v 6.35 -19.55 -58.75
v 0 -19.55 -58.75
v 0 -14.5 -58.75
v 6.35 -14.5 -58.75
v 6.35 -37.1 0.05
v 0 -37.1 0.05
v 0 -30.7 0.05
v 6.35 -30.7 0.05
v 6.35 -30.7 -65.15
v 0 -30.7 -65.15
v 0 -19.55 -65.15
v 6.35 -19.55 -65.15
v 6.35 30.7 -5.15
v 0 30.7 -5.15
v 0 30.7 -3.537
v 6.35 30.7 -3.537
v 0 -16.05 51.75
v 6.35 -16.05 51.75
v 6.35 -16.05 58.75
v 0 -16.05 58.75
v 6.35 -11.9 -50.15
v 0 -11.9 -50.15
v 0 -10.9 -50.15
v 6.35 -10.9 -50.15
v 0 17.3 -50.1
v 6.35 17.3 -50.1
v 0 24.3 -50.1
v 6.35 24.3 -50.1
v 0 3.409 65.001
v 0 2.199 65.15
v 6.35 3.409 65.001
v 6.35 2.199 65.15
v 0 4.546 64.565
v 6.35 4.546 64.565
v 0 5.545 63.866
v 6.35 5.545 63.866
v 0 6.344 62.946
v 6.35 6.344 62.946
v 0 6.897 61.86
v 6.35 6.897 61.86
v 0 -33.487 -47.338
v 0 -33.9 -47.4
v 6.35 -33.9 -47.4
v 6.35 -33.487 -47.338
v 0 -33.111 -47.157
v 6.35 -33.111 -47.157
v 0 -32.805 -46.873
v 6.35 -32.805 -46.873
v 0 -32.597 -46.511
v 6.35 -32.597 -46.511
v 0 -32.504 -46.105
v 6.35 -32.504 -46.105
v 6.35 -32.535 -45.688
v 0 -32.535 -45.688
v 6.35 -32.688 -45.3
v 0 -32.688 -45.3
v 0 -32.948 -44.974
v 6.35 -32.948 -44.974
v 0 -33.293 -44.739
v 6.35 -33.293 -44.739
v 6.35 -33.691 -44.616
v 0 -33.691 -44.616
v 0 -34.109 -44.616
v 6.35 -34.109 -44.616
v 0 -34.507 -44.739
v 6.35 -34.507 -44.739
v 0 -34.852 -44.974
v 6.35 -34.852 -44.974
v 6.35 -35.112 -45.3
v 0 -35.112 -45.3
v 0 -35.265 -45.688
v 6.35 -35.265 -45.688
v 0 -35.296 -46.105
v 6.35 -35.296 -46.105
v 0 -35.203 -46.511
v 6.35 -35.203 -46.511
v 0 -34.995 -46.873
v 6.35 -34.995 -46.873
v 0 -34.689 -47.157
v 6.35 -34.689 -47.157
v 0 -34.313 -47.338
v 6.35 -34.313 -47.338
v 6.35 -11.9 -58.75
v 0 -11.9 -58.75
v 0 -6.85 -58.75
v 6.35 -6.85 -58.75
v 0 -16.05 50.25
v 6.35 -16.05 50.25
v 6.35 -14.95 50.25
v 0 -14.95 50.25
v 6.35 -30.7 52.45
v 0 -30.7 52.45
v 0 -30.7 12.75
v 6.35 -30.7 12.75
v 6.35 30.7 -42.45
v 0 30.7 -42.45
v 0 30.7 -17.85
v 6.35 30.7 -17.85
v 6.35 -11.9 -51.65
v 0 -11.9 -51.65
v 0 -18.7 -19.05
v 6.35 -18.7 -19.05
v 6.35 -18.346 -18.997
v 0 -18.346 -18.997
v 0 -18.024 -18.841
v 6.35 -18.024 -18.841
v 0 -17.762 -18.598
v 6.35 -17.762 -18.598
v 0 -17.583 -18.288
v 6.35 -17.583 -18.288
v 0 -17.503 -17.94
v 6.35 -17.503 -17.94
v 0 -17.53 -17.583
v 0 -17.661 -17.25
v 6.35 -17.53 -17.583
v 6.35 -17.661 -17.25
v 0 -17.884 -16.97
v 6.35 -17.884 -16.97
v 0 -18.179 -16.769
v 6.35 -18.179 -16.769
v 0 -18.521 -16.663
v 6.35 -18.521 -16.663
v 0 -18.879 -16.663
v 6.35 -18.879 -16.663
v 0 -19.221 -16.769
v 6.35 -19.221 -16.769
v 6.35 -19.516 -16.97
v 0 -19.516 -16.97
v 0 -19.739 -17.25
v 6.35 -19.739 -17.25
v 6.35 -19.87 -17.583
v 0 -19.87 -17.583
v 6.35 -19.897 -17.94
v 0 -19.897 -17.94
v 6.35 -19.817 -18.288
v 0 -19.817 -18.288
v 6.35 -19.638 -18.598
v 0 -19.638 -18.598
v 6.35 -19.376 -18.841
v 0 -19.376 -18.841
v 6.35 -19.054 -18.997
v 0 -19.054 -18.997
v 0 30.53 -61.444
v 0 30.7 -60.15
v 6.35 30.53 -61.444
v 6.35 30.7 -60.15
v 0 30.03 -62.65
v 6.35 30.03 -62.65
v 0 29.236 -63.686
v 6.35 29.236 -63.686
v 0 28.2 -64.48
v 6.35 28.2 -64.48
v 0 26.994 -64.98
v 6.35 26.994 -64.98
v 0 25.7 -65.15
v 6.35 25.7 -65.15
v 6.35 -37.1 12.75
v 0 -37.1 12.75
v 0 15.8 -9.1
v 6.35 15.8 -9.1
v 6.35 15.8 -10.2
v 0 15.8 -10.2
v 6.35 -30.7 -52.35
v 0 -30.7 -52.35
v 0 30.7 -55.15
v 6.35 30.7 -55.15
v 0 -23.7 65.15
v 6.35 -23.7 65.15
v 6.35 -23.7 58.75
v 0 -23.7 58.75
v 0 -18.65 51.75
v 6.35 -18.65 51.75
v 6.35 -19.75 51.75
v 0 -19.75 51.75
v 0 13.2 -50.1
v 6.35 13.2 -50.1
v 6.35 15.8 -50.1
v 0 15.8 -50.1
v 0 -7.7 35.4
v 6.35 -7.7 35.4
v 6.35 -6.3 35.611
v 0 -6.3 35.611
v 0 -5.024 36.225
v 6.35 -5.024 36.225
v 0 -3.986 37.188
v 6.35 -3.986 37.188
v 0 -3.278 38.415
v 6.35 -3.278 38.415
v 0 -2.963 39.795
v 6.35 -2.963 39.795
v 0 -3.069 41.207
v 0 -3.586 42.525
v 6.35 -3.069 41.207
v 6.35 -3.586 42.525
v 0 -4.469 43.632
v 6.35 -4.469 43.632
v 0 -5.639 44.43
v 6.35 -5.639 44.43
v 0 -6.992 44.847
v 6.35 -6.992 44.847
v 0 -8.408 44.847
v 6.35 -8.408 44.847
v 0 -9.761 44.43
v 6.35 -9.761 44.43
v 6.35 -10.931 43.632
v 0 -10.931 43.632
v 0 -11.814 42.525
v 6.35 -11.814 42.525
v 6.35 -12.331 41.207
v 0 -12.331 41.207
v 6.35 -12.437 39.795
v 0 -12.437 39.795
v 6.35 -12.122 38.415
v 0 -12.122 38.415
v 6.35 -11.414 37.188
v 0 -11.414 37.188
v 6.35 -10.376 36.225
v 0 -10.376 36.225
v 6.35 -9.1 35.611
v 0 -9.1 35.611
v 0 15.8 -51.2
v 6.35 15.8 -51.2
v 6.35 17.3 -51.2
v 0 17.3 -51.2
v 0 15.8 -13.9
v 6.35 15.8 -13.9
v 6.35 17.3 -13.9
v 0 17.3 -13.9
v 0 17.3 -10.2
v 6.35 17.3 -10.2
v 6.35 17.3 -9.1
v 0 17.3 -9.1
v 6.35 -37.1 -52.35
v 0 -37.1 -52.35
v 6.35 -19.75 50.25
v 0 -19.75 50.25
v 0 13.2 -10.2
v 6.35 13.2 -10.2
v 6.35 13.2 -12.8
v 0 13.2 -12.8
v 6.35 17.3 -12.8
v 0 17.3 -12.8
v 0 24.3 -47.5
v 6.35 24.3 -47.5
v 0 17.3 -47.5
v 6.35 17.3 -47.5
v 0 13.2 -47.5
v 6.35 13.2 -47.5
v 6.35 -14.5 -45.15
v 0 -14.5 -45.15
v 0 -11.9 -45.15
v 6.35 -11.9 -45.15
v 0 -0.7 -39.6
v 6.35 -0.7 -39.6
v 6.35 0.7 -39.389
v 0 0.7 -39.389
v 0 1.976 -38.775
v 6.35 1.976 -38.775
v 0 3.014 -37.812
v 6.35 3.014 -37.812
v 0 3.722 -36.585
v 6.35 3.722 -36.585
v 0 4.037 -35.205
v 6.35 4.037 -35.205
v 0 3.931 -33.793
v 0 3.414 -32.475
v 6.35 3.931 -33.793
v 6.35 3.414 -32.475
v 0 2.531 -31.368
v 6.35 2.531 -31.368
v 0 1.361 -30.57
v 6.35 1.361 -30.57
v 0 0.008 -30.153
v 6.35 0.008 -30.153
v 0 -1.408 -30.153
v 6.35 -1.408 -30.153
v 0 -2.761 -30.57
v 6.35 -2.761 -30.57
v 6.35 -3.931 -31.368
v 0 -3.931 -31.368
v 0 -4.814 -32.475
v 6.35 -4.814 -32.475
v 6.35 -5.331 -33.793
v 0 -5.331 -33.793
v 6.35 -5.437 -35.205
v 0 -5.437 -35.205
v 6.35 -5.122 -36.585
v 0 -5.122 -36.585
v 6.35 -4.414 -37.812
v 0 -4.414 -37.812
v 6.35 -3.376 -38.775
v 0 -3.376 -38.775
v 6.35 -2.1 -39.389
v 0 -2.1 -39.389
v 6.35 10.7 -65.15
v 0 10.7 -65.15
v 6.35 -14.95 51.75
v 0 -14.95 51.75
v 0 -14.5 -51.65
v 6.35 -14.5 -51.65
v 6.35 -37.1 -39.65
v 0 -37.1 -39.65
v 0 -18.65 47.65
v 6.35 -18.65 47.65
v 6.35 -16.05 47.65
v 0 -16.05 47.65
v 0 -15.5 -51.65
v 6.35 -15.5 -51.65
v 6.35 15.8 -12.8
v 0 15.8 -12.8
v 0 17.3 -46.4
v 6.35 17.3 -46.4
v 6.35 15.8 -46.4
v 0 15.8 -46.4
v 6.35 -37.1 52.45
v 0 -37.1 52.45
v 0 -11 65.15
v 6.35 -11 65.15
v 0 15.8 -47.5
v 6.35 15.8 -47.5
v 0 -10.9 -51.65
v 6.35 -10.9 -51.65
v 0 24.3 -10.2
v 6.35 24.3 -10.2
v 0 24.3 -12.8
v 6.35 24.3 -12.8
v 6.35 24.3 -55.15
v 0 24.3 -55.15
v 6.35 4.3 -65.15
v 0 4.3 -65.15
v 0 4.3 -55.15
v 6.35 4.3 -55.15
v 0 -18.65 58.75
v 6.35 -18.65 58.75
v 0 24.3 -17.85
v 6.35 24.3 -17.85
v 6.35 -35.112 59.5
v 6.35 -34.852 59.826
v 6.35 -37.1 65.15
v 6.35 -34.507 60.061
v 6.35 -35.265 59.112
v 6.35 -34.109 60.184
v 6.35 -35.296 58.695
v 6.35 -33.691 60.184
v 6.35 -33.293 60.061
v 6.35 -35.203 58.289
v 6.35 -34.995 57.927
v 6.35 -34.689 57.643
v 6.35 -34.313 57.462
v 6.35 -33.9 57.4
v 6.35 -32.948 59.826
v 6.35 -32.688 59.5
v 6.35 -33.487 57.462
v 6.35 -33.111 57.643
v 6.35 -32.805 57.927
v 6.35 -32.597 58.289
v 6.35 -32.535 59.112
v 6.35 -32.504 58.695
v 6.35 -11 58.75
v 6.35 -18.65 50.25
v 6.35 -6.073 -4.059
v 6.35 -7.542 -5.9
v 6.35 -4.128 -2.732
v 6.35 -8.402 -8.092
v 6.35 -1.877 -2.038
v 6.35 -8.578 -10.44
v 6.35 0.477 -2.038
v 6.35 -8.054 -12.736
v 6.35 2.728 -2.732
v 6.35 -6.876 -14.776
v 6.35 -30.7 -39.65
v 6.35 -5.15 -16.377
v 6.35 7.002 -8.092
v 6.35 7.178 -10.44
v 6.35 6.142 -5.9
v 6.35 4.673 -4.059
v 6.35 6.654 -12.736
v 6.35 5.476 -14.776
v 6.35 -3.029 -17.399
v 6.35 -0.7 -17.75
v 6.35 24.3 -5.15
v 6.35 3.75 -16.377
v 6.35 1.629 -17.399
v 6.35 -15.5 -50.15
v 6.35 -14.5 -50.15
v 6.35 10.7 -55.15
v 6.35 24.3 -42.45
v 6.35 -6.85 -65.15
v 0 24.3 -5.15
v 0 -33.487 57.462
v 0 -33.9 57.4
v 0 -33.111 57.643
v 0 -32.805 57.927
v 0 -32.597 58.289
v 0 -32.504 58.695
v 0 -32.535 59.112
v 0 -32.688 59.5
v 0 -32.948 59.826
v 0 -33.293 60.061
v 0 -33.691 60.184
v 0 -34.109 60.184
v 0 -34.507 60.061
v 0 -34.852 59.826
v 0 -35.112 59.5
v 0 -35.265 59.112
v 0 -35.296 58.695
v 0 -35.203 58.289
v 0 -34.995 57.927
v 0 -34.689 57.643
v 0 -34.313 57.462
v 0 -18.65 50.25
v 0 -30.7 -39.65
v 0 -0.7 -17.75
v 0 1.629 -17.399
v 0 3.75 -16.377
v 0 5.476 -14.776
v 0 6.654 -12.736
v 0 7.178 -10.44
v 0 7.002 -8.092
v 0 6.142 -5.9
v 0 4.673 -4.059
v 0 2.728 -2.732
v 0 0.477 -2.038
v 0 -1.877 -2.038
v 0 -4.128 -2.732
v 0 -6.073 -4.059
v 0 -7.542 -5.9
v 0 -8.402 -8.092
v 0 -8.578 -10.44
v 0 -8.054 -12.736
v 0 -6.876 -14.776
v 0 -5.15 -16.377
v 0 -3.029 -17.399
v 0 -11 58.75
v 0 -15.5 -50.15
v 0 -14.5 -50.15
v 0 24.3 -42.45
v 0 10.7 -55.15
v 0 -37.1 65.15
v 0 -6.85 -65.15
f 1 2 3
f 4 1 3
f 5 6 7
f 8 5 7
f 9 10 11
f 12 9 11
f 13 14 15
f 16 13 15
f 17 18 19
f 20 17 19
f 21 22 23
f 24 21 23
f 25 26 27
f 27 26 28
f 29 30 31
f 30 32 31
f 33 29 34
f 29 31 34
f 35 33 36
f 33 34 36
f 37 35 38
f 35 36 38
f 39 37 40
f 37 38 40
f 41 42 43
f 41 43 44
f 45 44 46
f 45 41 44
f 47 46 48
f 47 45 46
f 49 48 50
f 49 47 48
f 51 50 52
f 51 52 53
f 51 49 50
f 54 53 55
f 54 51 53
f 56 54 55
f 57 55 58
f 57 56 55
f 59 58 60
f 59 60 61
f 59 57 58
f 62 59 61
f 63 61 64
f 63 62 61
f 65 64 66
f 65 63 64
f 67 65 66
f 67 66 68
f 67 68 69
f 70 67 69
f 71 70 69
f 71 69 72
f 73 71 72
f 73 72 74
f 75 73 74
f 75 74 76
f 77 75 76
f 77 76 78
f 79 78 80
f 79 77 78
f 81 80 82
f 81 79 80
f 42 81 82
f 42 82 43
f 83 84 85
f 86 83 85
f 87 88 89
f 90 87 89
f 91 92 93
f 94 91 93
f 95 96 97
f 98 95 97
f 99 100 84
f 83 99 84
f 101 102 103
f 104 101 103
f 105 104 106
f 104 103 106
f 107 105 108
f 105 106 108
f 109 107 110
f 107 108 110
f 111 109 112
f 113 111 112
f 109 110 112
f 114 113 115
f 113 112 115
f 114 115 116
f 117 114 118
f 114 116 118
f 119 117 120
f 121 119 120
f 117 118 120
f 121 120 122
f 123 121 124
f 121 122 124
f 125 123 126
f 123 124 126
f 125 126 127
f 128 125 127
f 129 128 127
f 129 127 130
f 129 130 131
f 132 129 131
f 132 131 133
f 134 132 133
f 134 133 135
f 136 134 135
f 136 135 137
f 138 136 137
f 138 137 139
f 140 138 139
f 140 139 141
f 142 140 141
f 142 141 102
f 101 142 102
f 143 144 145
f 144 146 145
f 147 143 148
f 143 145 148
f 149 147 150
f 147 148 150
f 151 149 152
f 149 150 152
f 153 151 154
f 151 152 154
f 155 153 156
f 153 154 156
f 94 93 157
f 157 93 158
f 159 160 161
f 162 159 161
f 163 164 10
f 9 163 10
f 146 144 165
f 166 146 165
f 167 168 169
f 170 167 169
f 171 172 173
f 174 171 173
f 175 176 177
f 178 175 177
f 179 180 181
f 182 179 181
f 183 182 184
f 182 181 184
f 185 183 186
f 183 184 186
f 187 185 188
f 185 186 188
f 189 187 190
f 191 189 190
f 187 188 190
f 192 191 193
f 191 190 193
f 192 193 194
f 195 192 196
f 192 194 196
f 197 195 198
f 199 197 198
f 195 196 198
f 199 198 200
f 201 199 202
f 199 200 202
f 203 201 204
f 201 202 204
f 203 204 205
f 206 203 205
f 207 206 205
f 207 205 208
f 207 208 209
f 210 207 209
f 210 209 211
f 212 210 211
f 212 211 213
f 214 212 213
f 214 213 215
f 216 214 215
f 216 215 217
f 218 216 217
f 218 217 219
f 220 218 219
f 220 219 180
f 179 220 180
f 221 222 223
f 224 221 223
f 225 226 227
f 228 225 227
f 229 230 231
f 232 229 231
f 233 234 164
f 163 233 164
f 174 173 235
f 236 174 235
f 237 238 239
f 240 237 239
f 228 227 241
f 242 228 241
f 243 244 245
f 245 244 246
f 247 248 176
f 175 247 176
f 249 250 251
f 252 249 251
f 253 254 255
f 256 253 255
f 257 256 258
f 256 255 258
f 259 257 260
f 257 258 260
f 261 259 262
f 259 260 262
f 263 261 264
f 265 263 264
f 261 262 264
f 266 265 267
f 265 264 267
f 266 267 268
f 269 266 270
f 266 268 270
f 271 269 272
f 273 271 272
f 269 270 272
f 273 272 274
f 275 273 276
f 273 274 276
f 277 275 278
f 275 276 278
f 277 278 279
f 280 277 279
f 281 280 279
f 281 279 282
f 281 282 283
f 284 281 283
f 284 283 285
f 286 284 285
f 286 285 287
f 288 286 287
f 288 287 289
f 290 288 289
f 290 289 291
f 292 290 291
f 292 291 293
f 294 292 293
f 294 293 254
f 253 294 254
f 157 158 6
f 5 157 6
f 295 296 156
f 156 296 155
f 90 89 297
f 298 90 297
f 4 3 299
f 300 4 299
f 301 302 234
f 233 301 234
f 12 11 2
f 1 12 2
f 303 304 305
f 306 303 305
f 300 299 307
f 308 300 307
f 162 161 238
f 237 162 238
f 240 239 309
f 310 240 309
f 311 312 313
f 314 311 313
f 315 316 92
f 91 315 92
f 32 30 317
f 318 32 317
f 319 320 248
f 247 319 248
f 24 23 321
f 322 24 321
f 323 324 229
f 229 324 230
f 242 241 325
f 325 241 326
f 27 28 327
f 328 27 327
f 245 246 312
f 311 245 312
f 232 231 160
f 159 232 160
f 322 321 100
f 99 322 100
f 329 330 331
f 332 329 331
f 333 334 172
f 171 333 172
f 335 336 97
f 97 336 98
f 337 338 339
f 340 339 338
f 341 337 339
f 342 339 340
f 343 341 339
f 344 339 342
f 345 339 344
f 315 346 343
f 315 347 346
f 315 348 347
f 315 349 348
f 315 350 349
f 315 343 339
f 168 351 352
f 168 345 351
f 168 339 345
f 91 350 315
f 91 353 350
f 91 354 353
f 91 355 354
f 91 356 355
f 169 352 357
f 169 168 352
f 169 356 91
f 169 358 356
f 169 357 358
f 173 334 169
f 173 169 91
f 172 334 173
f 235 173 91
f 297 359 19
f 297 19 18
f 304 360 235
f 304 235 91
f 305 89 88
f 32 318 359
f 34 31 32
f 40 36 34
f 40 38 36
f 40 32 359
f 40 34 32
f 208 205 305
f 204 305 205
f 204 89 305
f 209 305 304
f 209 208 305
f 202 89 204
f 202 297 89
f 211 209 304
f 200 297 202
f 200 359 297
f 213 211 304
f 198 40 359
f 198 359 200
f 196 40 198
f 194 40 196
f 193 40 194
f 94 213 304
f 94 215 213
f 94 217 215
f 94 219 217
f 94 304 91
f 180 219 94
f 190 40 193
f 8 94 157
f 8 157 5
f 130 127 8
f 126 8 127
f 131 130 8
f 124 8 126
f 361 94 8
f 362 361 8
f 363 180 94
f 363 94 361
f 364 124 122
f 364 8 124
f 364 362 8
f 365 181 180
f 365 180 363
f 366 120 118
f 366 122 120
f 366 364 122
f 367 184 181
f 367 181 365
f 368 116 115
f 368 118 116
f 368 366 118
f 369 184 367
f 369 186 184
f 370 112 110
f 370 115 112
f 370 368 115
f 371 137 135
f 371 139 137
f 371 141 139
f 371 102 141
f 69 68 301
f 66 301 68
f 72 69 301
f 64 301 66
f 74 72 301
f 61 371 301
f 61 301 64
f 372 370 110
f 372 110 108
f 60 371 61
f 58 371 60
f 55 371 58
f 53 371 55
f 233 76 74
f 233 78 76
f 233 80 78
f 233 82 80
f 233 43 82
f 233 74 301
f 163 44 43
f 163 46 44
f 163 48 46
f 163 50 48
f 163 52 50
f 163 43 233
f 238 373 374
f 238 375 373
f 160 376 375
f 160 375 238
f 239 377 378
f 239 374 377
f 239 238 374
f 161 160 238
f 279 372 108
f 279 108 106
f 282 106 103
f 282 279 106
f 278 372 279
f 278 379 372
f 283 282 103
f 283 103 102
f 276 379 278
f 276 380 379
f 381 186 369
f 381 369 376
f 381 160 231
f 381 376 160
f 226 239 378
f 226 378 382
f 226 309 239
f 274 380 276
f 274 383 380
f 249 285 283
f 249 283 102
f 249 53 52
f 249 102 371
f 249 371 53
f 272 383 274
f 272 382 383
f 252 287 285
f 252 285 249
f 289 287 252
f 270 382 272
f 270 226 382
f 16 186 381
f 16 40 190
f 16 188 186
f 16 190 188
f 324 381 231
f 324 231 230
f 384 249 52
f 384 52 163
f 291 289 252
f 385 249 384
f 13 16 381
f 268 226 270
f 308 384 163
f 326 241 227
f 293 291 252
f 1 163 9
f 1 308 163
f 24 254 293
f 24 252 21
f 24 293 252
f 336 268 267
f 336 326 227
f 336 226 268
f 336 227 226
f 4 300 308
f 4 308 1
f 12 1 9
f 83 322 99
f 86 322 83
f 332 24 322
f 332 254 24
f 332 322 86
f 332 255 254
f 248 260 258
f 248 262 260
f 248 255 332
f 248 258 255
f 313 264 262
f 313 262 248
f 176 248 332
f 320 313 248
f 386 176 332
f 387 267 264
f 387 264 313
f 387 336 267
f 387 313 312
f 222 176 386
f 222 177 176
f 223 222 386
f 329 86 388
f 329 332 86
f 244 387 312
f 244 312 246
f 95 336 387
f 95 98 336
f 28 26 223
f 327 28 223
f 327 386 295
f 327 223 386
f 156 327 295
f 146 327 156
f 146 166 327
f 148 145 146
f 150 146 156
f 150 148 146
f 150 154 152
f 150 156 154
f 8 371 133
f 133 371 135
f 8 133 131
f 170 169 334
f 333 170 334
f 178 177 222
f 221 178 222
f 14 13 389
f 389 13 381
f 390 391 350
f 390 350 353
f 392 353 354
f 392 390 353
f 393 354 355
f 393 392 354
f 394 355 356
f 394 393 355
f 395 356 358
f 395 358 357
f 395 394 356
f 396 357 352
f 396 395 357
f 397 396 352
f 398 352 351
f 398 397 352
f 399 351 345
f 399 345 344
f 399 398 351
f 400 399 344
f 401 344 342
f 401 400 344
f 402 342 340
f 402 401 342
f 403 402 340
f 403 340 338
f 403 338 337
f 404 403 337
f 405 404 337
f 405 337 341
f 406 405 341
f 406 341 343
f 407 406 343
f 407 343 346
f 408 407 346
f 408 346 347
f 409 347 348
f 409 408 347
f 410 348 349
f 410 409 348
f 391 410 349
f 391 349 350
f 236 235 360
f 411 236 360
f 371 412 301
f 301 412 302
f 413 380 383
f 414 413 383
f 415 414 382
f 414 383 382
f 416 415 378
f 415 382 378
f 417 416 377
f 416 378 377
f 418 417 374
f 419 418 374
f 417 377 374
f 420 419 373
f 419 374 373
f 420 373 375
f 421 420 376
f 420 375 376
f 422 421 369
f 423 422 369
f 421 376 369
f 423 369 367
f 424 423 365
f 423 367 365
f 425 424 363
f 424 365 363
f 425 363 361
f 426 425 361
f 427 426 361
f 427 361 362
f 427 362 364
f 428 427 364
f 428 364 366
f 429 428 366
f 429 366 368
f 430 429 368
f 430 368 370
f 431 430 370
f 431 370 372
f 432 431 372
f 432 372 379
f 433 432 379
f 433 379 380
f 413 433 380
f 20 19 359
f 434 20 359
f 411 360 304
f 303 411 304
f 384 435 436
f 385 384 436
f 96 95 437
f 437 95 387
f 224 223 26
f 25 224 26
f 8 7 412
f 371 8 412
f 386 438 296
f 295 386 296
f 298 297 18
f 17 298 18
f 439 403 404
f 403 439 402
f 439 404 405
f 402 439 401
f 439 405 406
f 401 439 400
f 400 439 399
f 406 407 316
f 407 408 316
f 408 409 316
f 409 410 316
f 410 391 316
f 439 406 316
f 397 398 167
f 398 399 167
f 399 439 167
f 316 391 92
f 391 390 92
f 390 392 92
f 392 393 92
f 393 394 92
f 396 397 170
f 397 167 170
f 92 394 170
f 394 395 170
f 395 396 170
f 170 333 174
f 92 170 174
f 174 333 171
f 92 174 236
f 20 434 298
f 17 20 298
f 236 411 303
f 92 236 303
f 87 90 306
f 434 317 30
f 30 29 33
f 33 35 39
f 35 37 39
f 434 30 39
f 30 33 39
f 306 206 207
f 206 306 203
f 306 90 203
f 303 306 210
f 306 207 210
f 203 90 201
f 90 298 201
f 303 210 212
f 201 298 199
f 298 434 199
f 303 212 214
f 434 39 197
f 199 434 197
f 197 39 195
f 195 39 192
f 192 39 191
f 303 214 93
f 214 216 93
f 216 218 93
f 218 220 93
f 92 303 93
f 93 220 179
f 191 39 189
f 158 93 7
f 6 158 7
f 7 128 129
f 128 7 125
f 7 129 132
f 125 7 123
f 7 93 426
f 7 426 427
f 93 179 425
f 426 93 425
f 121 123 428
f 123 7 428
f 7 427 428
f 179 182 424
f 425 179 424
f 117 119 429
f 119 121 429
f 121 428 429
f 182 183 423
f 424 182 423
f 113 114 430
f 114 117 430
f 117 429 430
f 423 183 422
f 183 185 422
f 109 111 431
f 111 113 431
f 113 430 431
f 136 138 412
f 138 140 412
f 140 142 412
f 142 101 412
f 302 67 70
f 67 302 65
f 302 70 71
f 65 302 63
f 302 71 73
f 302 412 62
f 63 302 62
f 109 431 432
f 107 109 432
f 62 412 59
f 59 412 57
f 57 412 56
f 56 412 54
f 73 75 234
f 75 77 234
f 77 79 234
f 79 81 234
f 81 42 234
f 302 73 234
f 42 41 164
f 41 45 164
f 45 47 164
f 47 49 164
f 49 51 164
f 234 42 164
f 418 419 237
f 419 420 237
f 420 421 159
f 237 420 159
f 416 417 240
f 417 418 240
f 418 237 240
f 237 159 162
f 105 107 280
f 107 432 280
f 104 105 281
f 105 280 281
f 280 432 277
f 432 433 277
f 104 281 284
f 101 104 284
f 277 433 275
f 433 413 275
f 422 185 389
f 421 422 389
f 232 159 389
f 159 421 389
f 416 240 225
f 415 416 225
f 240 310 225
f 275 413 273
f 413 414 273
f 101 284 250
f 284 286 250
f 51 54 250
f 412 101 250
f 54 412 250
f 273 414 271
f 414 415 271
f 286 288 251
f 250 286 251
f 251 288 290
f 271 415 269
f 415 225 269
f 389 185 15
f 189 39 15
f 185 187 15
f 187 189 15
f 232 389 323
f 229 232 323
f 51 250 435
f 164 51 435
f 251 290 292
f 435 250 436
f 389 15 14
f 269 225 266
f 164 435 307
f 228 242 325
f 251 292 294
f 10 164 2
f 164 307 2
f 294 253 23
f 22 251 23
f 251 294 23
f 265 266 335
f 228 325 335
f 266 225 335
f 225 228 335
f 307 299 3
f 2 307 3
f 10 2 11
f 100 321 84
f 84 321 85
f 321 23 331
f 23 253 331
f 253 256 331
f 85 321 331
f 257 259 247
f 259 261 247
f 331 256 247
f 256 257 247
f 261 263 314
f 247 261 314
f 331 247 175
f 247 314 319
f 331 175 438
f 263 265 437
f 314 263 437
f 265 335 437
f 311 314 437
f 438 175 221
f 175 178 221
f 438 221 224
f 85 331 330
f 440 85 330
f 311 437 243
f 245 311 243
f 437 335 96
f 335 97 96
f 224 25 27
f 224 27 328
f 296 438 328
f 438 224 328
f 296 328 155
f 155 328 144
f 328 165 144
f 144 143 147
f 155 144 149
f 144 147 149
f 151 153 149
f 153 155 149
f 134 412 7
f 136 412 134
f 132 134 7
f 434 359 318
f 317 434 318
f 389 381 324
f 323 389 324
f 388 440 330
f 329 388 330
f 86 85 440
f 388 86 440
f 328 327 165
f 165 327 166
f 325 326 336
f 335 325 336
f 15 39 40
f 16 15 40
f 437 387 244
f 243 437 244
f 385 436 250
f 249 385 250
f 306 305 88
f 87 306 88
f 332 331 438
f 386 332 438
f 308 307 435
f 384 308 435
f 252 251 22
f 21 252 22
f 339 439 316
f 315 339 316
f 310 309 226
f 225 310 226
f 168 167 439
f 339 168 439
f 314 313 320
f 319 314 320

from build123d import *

# Parameters (mm, degrees)
SKETCH2_R              = 1.4
BOSS_EXTRUDE1_DEPTH    = 6.35
SKETCH3_R              = 4.75
SKETCH3_R_2            = 7.9
AXII_DEPTH             = 76.241311791
CHAMFER1_SIZE          = 25
CHAMFER1_SIZE2         = 68.686935486
FILLET1_R              = 5
PLATEATTACHMENTS_DEPTH = 76.241311791
SKETCH6_R              = 1.2
WIREGUIDE_DEPTH        = 76.241311791


with BuildPart() as part:
    # Sketch2 → Boss-Extrude1 (new body)
    with BuildSketch(Plane(origin=(0, 0, 0), x_dir=(0, 0, -1), z_dir=(1, 0, 0))):
        Polygon((52.35, -30.7), (65.15, -30.7), (65.15, -19.55), (58.75, -19.55), (58.75, -14.5), (51.65, -14.5), (51.65, -15.5), (50.15, -15.5), (50.15, -14.5), (45.15, -14.5), (45.15, -11.9), (50.15, -11.9), (50.15, -10.9), (51.65, -10.9), (51.65, -11.9), (58.75, -11.9), (58.75, -6.85), (65.15, -6.85), (65.15, 4.3), (55.15, 4.3), (55.15, 10.7), (65.15, 10.7), (65.15, 30.7), (-65.15, 30.7), (-65.15, -30.7), (-65.15, -37.1), (-52.45, -37.1), (-52.45, -30.7), (-12.75, -30.7), (-12.75, -37.1), (-0.05, -37.1), (-0.05, -30.7), (39.65, -30.7), (39.65, -37.1), (52.35, -37.1), align=None)
        with Locations((-58.8, -33.9)):
            Circle(SKETCH2_R, mode=Mode.SUBTRACT)
        with Locations((46, -33.9)):
            Circle(SKETCH2_R, mode=Mode.SUBTRACT)
    extrude(amount=BOSS_EXTRUDE1_DEPTH)

    # Sketch3 → Axii (cut, through all)
    with BuildSketch(Plane(origin=(6.35, 0, 0), x_dir=(0, 0, -1), z_dir=(1, 0, 0))):
        with Locations((-40.15, -7.7)):
            Circle(SKETCH3_R)
        with Locations((34.85, -0.7)):
            Circle(SKETCH3_R)
        with Locations((9.85, -0.7)):
            Circle(SKETCH3_R_2)
    extrude(amount=-AXII_DEPTH, mode=Mode.SUBTRACT)

    # Chamfer1
    chamfer1_edges = [part.edges().sort_by_distance(p)[0] for p in [
        (3.175, 30.7, 65.15),
    ]]
    chamfer1_side = [part.faces().sort_by_distance(p)[0] for p in [
        (3.175, -3.2, 65.15),
    ]]
    chamfer(chamfer1_edges, length=CHAMFER1_SIZE, length2=CHAMFER1_SIZE2, reference=chamfer1_side[0])

    # Fillet1
    fillet1_edges = [part.edges().sort_by_distance(p)[0] for p in [
        (3.175, 5.7, 65.15),
        (3.175, 30.7, -65.15),
    ]]
    fillet(fillet1_edges, radius=FILLET1_R)

    # Sketch5 → PlateAttachments (cut, through all)
    with BuildSketch(Plane(origin=(6.35, 0, 0), x_dir=(0, 0, -1), z_dir=(1, 0, 0))):
        Polygon((55.15, 24.3), (55.15, 30.7), (42.45, 30.7), (42.45, 24.3), (47.5, 24.3), (47.5, 17.3), (46.4, 17.3), (46.4, 15.8), (47.5, 15.8), (47.5, 13.2), (50.1, 13.2), (50.1, 15.8), (51.2, 15.8), (51.2, 17.3), (50.1, 17.3), (50.1, 24.3), align=None)
        Polygon((17.85, 30.7), (5.15, 30.7), (5.15, 24.3), (10.2, 24.3), (10.2, 17.3), (9.1, 17.3), (9.1, 15.8), (10.2, 15.8), (10.2, 13.2), (12.8, 13.2), (12.8, 15.8), (13.9, 15.8), (13.9, 17.3), (12.8, 17.3), (12.8, 24.3), (17.85, 24.3), align=None)
        Polygon((-58.75, -11), (-65.15, -11), (-65.15, -23.7), (-58.75, -23.7), (-58.75, -18.65), (-51.75, -18.65), (-51.75, -19.75), (-50.25, -19.75), (-50.25, -18.65), (-47.65, -18.65), (-47.65, -16.05), (-50.25, -16.05), (-50.25, -14.95), (-51.75, -14.95), (-51.75, -16.05), (-58.75, -16.05), align=None)
    extrude(amount=-PLATEATTACHMENTS_DEPTH, mode=Mode.SUBTRACT)

    # Sketch6 → WireGuide (cut, through all)
    with BuildSketch(Plane(origin=(6.35, 0, 0), x_dir=(0, 0, -1), z_dir=(1, 0, 0))):
        with Locations((17.85, -18.7)):
            Circle(SKETCH6_R)
    extrude(amount=-WIREGUIDE_DEPTH, mode=Mode.SUBTRACT)


solid = part.part
